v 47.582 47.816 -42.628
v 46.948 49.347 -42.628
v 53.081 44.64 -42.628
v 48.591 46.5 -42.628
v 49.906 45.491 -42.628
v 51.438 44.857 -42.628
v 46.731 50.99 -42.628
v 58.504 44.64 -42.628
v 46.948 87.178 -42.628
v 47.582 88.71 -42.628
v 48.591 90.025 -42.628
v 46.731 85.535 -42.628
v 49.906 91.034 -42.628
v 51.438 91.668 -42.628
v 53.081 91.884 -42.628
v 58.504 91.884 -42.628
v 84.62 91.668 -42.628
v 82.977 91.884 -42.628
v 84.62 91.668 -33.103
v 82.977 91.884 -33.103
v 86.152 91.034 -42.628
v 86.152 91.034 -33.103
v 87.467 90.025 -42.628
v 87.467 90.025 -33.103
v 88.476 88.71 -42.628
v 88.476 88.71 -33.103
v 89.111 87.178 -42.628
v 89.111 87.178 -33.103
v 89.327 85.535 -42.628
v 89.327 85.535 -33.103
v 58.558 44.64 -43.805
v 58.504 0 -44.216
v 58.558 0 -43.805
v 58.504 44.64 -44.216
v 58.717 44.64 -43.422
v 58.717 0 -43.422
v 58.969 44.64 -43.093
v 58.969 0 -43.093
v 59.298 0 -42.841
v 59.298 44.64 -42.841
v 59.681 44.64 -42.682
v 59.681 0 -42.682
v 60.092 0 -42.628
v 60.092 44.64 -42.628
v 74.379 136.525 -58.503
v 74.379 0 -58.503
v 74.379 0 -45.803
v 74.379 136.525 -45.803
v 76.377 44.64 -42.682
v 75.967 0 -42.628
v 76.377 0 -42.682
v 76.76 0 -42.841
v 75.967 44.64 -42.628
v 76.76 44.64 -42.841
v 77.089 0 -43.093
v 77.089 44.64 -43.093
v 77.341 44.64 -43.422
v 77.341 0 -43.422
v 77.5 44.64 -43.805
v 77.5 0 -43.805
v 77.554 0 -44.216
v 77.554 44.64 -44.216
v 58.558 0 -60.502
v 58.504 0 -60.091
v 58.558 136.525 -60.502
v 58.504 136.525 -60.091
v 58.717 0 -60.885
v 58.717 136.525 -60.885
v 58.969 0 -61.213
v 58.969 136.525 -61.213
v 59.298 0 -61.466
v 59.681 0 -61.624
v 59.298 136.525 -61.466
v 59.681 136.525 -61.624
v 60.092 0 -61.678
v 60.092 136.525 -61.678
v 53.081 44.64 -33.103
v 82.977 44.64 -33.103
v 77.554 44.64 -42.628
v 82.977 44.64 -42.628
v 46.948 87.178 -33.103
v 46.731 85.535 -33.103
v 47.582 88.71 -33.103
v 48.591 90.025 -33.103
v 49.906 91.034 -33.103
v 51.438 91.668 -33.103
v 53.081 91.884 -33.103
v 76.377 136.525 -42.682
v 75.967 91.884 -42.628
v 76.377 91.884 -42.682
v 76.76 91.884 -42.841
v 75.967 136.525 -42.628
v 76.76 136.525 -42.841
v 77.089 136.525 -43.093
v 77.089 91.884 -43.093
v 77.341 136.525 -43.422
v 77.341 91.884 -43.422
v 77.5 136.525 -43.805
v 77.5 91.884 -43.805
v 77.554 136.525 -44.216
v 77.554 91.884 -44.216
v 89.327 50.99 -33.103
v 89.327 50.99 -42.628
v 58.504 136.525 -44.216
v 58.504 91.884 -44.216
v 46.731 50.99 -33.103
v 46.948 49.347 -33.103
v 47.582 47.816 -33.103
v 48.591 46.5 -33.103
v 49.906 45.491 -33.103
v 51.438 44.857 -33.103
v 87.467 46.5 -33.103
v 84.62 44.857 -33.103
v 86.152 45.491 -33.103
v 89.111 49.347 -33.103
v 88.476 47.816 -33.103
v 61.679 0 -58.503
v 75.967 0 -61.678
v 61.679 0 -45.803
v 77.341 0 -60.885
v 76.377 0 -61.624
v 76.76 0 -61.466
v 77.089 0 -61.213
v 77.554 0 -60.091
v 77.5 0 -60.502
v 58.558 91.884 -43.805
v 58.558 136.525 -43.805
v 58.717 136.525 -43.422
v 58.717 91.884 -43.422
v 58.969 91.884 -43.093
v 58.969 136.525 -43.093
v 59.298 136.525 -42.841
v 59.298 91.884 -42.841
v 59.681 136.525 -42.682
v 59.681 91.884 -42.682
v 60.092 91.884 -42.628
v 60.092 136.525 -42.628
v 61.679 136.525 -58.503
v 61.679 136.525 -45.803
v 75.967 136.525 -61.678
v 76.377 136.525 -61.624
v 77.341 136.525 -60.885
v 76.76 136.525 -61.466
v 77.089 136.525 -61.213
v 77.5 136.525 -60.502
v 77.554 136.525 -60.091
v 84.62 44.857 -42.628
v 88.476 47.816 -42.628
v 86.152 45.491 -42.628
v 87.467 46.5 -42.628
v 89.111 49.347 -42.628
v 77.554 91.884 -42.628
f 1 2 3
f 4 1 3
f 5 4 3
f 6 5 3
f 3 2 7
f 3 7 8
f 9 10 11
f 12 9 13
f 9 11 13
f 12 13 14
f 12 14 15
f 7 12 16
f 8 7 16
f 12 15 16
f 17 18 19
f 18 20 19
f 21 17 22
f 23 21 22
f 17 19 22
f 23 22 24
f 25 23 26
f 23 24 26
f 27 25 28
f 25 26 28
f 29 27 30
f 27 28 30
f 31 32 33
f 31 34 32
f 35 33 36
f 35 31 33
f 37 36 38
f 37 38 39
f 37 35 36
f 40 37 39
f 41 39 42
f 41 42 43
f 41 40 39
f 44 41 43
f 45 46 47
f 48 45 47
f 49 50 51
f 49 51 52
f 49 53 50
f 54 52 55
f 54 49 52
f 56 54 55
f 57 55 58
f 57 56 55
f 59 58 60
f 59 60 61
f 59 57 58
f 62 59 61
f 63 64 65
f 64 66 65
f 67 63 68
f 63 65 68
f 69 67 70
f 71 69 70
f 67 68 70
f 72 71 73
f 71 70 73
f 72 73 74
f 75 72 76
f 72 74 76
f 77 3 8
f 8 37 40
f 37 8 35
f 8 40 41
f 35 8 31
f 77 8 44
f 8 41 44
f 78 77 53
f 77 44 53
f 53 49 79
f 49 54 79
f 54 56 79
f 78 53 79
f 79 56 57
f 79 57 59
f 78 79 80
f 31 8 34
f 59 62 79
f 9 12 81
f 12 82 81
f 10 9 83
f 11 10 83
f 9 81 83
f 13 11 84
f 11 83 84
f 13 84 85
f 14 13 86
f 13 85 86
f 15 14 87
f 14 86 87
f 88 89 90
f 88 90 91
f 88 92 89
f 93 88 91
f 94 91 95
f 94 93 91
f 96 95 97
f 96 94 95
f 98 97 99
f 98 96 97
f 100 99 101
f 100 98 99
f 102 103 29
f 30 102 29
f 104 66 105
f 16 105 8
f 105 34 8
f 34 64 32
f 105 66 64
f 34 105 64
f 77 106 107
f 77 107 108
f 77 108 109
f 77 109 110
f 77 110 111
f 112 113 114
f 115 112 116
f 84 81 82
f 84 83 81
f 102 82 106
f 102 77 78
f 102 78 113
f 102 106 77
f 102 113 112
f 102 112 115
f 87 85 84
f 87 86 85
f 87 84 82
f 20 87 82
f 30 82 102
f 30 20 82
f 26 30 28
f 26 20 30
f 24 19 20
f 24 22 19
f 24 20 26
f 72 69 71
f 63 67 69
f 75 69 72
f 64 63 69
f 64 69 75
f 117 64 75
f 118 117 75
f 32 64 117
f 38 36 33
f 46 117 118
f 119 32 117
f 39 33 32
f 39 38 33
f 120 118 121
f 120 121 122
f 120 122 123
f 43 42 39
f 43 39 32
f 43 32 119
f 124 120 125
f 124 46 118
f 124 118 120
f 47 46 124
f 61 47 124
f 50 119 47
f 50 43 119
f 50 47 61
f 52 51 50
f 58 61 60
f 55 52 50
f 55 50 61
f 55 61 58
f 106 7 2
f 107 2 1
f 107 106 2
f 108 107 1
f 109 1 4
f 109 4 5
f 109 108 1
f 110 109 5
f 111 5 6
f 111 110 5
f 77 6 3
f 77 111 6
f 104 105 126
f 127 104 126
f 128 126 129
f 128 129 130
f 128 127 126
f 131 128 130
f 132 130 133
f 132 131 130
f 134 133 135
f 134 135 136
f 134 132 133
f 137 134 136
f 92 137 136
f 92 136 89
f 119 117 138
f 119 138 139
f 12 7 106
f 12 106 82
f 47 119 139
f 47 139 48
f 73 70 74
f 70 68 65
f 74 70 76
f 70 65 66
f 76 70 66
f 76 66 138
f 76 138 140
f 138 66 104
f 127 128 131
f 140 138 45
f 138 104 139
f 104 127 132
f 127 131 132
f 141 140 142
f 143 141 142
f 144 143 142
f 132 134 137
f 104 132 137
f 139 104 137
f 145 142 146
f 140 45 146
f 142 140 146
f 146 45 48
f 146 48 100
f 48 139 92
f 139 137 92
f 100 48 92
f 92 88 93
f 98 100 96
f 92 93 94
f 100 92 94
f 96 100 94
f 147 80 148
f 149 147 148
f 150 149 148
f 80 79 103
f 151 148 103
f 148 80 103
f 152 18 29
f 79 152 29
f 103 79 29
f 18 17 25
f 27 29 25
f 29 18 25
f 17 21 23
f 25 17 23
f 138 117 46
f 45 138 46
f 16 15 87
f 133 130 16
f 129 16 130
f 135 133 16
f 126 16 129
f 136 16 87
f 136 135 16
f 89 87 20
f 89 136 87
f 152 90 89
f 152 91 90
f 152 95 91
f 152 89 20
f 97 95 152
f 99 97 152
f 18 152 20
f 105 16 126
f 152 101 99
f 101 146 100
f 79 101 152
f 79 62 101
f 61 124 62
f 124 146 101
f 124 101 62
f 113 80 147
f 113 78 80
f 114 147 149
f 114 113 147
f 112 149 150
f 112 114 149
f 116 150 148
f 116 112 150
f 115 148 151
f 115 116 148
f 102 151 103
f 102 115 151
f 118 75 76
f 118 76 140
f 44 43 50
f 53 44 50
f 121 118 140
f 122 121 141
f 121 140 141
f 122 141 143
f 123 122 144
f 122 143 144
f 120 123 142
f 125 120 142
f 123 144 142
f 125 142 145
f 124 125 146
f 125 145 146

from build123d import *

# Parameters (mm, degrees)
F0_W     = 19.05
F0_H     = 19.05
F0_W_2   = 12.7
F0_H_2   = 12.7
F1_DEPTH = 136.525
F2_W     = 42.5958
F2_H     = 47.244
F3_DEPTH = 9.525
F4_R     = 6.35
F5_R     = 1.5875


with BuildPart() as f1:
    # F0 (on Front) → F1 (new body)
    with BuildSketch(Plane.XZ):
        with Locations((68.0290833116, -52.153282702)):
            Rectangle(F0_W, F0_H)
        with Locations((68.0290833116, -52.153282702)):
            Rectangle(F0_W_2, F0_H_2, mode=Mode.SUBTRACT)
    extrude(amount=-F1_DEPTH)

    # F2 (on face) → F3 (join)
    with BuildSketch(Plane.XY.offset(-42.628282702)):
        with Locations((68.0290833116, 68.2625)):
            Rectangle(F2_W, F2_H)
    extrude(amount=F3_DEPTH)

    # F4
    f4_edges = [f1.edges().sort_by_distance(p)[0] for p in [
        (89.326983, 44.6405, -37.865783),
        (89.326983, 91.8845, -37.865783),
        (46.731183, 44.6405, -37.865783),
        (46.731183, 91.8845, -37.865783),
    ]]
    fillet(f4_edges, radius=F4_R)

    # F5
    f5_edges = [f1.edges().sort_by_distance(p)[0] for p in [
        (77.554083, 68.2625, -61.678283),
        (58.504083, 68.2625, -61.678283),
        (58.504083, 22.32025, -42.628283),
        (77.554083, 22.32025, -42.628283),
        (58.504083, 114.20475, -42.628283),
        (77.554083, 114.20475, -42.628283),
    ]]
    fillet(f5_edges, radius=F5_R)


solid = f1.part
